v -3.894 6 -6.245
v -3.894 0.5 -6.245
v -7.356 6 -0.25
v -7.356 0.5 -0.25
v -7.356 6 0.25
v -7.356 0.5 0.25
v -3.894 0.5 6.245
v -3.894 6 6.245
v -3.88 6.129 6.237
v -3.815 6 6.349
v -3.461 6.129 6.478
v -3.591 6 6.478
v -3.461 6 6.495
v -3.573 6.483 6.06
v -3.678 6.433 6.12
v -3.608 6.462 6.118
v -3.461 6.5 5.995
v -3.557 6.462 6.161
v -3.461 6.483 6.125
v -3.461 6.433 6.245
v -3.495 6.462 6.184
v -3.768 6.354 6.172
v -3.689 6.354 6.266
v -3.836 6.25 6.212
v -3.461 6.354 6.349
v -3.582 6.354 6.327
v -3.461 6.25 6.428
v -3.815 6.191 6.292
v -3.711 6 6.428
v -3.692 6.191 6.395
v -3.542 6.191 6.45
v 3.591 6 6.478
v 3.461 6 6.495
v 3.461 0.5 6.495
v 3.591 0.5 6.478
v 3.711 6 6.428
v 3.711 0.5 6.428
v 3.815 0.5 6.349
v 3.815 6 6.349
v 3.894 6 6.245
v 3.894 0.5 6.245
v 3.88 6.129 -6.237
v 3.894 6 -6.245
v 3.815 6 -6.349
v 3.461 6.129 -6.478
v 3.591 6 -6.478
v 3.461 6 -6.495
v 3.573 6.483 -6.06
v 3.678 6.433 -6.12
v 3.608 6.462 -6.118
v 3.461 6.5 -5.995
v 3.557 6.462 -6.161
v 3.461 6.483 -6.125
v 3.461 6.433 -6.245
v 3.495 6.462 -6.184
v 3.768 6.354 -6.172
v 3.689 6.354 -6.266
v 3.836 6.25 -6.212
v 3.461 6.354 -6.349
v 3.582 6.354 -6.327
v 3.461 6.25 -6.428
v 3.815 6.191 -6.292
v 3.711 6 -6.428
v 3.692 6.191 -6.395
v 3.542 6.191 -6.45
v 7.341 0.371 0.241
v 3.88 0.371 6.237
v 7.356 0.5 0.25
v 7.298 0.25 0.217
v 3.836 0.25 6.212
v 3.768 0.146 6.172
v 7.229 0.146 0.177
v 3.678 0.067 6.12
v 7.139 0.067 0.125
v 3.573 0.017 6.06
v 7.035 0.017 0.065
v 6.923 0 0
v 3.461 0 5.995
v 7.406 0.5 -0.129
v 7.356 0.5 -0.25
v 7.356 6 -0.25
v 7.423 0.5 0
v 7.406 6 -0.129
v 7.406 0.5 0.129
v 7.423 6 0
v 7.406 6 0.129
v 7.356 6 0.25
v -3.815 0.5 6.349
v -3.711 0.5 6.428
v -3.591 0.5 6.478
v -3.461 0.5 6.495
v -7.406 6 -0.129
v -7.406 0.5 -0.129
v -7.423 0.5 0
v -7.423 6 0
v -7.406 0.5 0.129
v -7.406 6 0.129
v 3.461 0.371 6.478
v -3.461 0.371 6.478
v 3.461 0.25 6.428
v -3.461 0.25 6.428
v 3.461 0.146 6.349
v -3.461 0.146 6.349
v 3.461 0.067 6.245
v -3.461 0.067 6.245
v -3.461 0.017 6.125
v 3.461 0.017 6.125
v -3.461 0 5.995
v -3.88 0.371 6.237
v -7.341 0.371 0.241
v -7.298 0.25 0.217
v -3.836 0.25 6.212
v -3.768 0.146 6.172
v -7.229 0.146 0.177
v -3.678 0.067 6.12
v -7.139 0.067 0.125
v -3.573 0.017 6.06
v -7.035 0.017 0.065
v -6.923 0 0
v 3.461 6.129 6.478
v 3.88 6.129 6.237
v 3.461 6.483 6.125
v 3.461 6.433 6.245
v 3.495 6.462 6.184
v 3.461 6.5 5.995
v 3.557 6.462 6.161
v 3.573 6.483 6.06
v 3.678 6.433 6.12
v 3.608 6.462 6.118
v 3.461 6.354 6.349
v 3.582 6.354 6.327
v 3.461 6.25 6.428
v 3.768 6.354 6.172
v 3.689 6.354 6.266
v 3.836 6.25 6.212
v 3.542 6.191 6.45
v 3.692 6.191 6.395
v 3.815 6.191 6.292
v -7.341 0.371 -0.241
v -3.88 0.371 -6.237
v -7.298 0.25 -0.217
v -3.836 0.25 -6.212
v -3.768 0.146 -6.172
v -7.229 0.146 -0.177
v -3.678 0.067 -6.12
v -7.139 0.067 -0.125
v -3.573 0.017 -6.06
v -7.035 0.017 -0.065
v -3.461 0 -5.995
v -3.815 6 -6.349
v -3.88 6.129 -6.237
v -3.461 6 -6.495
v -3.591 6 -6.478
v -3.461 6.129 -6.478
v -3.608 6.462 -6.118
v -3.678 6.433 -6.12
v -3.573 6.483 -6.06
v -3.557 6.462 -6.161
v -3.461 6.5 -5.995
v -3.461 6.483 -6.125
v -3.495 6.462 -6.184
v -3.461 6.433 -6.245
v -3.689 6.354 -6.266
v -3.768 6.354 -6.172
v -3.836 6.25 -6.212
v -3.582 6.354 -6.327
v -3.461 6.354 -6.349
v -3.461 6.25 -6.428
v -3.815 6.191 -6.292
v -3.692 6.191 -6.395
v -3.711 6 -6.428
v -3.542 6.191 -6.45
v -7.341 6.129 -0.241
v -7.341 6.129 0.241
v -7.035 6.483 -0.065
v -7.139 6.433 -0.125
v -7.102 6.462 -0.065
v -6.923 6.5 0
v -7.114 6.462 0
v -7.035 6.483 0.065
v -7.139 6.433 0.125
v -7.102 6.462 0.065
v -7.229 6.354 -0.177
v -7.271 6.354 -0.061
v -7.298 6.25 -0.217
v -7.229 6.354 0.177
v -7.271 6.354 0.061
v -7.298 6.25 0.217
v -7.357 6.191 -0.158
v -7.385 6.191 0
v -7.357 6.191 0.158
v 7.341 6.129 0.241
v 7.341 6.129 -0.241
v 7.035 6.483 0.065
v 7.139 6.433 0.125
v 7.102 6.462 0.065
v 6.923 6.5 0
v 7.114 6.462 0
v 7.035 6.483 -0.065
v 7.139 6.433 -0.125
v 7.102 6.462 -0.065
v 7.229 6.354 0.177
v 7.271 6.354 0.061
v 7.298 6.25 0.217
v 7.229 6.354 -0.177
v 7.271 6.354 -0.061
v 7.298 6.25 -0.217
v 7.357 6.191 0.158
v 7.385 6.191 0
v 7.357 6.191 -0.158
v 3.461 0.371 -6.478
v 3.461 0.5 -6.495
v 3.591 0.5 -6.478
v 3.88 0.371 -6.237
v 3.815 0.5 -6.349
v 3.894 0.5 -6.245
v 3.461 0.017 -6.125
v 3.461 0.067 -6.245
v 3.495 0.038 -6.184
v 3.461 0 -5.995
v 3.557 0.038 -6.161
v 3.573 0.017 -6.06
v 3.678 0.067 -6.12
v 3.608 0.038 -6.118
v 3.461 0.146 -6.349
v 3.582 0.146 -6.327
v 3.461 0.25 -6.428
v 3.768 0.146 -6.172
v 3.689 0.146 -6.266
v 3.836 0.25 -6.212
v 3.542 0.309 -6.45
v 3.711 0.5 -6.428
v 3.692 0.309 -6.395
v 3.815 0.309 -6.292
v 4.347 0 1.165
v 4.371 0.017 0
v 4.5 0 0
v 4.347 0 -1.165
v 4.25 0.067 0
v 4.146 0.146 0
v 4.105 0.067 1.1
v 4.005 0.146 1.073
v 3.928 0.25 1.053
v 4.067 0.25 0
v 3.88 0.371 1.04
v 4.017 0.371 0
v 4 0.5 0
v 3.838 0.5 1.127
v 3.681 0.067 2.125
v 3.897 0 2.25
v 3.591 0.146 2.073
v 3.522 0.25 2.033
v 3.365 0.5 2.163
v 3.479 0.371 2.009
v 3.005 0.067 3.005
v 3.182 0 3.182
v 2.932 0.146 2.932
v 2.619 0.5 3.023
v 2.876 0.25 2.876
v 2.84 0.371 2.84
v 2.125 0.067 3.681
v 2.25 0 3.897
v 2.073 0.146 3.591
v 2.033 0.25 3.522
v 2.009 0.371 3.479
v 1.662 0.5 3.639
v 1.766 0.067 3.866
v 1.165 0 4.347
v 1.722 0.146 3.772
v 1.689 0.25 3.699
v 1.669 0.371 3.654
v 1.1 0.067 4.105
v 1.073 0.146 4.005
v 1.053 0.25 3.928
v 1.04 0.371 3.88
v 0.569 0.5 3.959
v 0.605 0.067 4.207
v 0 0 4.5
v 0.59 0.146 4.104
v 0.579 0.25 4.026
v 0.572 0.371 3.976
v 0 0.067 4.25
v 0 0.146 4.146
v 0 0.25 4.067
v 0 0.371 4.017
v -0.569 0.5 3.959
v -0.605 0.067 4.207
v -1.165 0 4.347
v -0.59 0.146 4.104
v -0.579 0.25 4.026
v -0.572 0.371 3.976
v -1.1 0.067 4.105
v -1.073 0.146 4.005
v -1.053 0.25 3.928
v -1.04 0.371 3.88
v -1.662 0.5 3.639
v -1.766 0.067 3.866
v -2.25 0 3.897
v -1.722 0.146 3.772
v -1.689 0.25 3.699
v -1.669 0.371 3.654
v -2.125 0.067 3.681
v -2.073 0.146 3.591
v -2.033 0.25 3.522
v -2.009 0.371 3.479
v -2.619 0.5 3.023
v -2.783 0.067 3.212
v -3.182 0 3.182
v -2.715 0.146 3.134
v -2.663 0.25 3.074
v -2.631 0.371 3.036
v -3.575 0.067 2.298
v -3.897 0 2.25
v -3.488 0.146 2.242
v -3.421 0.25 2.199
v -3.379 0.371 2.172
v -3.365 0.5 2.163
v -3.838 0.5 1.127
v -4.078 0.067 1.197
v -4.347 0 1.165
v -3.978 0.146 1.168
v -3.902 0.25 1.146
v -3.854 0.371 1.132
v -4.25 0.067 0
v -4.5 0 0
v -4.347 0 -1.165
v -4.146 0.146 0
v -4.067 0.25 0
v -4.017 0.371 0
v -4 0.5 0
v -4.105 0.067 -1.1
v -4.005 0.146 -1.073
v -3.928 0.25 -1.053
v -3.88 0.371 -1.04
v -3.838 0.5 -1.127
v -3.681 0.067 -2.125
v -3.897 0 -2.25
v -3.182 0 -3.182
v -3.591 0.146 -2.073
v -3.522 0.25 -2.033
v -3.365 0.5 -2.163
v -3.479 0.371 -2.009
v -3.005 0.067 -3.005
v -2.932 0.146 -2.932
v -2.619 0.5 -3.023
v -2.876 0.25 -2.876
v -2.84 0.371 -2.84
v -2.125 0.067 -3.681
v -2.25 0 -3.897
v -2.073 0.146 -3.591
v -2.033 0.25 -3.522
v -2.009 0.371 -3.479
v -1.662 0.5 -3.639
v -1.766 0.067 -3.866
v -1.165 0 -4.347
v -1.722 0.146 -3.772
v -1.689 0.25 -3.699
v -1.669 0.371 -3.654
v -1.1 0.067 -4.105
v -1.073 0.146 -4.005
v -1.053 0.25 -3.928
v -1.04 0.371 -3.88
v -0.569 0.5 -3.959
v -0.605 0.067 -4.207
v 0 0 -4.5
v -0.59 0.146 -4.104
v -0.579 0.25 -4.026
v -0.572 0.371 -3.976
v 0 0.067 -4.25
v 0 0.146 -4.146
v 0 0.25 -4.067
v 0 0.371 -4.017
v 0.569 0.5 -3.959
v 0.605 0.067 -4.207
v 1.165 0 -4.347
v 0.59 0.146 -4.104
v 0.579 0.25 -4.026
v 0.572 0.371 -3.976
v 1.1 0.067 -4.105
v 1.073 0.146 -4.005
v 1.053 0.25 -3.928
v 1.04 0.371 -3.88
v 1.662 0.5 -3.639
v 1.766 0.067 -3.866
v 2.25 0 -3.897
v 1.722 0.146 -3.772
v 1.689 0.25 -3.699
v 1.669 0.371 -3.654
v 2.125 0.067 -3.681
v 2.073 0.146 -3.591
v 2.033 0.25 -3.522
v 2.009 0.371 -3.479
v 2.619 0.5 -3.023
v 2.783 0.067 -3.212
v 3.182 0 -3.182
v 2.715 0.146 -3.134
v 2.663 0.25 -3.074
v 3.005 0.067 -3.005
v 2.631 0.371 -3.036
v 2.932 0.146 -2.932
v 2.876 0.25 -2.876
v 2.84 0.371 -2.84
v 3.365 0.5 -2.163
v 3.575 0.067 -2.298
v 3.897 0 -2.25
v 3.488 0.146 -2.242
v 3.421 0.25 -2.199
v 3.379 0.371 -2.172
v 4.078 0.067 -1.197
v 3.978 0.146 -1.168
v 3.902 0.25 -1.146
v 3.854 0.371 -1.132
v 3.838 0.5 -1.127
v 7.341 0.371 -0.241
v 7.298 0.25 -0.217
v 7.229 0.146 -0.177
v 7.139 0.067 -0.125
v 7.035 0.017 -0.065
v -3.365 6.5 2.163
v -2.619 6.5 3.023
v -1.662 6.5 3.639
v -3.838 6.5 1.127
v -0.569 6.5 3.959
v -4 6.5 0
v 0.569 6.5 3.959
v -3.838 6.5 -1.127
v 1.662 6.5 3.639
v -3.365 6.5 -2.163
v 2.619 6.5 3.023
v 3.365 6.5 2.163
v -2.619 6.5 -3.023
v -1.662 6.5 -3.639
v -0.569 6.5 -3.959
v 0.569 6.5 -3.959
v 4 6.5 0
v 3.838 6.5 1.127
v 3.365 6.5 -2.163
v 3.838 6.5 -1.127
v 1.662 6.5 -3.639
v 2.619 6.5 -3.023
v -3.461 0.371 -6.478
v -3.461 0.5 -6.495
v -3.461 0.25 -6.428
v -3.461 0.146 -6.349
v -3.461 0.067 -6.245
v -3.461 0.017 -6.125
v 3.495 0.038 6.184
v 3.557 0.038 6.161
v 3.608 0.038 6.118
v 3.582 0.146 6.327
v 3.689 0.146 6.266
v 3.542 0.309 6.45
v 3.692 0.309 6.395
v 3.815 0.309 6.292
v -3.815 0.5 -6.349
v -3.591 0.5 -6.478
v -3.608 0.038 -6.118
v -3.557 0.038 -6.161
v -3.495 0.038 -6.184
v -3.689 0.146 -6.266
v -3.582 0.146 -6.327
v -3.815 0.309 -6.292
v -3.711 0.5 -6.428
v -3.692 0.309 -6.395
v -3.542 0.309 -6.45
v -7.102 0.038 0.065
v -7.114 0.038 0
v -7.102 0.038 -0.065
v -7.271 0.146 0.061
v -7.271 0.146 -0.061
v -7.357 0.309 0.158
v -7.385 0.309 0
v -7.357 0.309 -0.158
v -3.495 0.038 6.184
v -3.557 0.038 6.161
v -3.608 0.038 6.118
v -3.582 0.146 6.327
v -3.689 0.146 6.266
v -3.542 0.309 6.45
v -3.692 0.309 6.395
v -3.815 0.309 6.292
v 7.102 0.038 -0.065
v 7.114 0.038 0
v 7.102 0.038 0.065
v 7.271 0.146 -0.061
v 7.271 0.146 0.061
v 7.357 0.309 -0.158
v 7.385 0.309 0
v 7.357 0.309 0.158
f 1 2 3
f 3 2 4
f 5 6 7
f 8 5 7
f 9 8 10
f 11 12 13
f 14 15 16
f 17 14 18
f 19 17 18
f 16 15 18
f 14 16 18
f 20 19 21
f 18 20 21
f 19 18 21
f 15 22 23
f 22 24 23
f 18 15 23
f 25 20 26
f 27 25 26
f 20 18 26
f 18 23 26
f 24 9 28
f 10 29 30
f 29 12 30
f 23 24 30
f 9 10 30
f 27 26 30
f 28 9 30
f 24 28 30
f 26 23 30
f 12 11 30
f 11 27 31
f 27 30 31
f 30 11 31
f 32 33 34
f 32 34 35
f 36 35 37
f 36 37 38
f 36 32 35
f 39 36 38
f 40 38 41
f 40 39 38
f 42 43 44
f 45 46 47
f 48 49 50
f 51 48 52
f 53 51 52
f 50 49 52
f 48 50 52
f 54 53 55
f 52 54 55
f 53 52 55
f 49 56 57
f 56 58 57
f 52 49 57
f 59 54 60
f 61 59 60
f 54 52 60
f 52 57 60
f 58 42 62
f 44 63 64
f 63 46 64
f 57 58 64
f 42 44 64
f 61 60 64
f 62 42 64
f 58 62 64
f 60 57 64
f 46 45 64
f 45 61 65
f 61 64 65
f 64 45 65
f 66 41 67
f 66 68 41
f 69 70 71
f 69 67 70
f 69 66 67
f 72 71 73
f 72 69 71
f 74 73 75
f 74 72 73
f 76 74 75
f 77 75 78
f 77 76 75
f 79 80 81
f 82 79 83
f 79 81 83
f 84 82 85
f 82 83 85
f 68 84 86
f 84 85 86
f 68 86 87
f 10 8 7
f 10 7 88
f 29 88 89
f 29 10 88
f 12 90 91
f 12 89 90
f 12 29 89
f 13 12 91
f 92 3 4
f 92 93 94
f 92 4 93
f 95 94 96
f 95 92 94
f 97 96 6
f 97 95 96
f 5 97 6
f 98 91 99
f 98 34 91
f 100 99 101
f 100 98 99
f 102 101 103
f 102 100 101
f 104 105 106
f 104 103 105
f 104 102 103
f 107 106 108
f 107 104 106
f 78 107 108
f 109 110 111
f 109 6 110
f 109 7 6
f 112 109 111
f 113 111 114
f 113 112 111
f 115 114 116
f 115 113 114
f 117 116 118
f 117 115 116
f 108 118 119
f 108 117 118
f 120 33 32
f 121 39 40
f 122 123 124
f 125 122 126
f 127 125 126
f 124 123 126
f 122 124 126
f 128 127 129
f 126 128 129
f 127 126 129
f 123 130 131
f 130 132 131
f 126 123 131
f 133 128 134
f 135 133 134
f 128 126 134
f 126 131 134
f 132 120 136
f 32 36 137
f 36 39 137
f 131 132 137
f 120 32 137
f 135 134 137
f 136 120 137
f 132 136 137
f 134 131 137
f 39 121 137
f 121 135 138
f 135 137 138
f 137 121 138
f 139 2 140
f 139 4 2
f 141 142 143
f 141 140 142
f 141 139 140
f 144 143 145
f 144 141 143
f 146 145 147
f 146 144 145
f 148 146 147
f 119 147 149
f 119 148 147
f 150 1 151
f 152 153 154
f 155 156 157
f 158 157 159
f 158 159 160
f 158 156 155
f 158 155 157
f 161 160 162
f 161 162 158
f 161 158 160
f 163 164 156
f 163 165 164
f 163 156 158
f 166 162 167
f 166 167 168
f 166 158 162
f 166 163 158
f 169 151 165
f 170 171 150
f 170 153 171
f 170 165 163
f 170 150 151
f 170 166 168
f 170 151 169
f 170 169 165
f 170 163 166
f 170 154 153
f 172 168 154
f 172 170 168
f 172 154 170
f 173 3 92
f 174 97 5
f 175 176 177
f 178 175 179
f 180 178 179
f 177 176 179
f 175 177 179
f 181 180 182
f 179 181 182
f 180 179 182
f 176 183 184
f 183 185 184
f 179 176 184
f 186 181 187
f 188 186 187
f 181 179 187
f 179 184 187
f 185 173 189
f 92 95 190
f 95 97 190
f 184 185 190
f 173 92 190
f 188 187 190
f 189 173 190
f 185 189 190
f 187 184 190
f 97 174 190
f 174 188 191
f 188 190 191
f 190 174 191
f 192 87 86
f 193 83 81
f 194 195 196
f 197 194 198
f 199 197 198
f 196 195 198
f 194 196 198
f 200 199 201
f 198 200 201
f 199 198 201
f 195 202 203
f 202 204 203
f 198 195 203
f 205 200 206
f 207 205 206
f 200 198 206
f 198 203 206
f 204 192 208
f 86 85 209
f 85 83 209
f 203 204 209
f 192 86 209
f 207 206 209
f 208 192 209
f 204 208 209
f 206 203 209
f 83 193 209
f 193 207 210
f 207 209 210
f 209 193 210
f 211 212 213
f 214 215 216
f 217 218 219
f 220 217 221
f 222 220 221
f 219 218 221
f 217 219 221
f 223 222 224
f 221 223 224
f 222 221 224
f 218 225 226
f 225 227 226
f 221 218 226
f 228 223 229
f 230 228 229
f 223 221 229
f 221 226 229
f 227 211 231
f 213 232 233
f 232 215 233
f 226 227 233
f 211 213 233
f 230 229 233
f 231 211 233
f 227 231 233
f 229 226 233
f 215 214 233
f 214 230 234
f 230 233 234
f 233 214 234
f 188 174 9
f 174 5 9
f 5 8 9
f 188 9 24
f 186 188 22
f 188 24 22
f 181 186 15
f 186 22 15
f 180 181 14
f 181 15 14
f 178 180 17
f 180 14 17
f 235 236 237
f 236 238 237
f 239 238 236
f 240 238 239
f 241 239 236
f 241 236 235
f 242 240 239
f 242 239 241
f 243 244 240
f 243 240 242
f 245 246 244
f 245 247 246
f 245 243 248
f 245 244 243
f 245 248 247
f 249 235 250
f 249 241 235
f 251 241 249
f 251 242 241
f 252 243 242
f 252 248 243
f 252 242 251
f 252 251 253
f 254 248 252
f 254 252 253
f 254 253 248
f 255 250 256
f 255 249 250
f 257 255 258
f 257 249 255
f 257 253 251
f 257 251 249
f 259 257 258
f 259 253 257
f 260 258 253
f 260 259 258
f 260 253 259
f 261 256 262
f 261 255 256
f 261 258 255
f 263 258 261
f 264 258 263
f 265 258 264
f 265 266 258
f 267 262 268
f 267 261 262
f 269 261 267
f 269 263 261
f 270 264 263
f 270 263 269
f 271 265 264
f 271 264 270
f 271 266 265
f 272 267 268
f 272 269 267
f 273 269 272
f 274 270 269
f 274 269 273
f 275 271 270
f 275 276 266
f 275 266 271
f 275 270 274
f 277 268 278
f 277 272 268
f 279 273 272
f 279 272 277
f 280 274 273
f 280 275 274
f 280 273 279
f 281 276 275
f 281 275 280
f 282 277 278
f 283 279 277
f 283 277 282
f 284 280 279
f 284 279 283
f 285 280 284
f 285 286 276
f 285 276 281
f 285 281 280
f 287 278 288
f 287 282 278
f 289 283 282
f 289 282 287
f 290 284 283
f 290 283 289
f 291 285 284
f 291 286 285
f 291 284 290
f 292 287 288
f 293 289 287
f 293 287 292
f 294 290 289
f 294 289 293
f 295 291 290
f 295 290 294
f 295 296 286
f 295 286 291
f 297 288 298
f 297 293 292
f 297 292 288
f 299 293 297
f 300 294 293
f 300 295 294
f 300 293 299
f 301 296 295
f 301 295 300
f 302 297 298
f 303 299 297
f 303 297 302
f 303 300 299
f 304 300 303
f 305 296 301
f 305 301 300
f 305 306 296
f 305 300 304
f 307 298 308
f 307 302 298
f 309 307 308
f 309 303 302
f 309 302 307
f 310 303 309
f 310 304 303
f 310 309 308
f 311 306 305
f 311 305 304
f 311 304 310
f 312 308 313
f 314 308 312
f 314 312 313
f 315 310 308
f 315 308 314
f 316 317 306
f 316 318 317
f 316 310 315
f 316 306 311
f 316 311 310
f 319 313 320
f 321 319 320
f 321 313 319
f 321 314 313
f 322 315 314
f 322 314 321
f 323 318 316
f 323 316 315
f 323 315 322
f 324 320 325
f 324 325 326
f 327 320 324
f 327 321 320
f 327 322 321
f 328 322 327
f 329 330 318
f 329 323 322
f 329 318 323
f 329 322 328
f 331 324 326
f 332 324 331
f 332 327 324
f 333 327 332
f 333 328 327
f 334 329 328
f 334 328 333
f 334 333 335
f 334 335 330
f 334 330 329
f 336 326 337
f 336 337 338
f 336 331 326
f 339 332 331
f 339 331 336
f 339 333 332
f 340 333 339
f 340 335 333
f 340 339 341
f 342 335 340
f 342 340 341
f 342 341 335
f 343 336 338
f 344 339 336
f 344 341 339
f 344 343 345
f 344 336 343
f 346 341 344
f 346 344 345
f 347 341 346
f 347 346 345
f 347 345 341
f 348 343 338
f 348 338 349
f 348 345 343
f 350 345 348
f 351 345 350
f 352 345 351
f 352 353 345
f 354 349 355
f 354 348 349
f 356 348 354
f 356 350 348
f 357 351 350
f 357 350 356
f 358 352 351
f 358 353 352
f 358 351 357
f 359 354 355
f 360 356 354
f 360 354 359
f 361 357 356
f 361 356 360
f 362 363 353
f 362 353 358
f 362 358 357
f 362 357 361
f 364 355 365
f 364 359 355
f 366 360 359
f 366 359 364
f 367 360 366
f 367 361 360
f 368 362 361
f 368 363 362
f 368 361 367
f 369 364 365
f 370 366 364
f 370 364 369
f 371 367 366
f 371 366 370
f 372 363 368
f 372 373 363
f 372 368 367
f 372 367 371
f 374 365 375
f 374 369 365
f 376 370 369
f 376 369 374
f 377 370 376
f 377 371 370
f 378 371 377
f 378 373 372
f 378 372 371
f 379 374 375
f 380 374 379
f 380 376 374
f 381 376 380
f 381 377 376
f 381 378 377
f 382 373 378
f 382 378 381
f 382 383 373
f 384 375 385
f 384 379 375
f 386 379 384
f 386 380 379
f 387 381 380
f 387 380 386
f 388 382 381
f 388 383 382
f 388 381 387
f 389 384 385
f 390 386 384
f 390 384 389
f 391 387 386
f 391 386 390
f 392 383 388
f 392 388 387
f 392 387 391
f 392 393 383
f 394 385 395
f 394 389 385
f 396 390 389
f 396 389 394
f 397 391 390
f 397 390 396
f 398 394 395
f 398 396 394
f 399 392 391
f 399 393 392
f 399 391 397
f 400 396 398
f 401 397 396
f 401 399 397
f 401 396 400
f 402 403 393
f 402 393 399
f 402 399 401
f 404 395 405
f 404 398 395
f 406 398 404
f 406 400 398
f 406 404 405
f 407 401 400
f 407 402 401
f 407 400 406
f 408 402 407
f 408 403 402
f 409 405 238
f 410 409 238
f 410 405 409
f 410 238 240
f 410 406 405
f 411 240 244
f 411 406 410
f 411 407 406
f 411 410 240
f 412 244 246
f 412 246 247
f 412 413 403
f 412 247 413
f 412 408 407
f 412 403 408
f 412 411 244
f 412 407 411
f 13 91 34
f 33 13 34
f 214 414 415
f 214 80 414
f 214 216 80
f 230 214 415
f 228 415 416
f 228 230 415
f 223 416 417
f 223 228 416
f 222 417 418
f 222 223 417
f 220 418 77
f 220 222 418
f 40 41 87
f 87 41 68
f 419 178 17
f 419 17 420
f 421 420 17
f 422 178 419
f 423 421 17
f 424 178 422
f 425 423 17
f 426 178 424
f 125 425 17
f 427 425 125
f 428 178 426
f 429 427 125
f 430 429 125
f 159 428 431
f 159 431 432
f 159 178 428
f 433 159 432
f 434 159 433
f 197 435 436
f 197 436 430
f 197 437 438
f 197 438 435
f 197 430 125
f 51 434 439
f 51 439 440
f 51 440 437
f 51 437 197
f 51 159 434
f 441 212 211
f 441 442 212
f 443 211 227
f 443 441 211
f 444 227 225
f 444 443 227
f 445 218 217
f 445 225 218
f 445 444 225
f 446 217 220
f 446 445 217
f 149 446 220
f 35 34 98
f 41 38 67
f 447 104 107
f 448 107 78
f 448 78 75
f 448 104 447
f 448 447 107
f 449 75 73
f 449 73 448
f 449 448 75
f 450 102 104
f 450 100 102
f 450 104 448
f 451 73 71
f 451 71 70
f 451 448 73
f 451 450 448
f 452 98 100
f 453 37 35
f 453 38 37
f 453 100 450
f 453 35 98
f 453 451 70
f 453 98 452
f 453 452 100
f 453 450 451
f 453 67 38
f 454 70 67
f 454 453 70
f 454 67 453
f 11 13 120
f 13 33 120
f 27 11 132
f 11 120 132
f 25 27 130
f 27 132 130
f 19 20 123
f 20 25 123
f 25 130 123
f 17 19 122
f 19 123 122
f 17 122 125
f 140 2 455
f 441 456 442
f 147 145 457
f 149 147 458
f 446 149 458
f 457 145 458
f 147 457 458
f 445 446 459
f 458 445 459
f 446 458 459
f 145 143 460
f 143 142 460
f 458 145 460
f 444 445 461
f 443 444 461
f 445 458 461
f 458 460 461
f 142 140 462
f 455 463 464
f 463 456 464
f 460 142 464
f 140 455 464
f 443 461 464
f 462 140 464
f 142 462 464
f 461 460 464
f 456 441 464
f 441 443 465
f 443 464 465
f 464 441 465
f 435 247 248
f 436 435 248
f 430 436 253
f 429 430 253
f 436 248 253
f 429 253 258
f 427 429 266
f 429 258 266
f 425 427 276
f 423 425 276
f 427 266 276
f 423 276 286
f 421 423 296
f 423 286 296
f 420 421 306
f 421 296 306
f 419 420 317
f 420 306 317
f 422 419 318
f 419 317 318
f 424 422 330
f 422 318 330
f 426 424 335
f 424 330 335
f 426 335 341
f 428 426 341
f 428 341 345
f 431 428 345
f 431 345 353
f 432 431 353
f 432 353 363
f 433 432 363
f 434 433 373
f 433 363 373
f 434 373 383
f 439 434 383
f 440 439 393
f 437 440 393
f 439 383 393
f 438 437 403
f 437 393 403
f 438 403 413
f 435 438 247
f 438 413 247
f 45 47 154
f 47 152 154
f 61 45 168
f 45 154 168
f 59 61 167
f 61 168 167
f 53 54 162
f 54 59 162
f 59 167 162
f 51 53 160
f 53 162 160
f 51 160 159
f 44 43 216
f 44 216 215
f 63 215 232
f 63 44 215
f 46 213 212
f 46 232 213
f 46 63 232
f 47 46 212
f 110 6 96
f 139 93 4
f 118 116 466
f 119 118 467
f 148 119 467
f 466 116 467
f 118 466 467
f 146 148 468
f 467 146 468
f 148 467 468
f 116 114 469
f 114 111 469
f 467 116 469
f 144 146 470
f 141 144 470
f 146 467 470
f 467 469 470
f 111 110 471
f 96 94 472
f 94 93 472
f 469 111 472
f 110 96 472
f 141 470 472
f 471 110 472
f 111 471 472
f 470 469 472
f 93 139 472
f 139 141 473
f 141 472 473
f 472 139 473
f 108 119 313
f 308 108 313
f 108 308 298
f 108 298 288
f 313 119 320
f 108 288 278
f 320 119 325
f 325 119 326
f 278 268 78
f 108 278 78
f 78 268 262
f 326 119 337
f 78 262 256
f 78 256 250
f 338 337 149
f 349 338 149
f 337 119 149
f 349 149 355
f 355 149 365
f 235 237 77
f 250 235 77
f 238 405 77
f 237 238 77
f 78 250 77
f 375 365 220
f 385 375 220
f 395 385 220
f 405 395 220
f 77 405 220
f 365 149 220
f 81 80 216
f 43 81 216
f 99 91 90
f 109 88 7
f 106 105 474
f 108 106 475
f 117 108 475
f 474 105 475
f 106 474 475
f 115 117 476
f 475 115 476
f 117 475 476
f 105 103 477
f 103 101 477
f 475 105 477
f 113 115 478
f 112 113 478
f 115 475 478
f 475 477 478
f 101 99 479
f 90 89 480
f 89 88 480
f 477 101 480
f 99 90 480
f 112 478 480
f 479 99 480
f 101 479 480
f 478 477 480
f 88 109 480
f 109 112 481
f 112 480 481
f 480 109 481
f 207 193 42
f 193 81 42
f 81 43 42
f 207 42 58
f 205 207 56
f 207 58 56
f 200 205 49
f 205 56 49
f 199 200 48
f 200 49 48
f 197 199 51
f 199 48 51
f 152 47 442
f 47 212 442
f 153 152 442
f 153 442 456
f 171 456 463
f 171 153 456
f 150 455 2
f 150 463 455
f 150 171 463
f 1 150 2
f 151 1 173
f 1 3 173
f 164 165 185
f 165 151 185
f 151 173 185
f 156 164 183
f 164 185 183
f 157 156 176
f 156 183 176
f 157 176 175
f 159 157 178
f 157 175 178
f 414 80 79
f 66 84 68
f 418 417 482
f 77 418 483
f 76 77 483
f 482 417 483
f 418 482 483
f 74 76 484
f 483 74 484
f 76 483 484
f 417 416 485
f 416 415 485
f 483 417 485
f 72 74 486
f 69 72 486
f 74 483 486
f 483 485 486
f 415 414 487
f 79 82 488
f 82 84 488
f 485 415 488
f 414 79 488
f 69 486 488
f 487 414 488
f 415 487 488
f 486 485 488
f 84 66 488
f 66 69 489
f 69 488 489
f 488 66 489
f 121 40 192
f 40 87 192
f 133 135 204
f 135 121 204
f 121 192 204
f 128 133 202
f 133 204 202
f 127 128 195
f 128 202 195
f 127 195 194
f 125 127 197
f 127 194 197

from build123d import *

# Parameters (mm, degrees)
EXTRUDE3_DEPTH = 6.5
FILLET3_R      = 0.5
SKETCH2_R      = 4
EXTRUDE4_DEPTH = 6.5
FILLET5_R      = 0.5


with BuildPart() as part:
    # Sketch1 → Extrude3 (new body)
    with BuildSketch(Plane(origin=(0, 0, 0), x_dir=(1, 0, 0), z_dir=(0, 1, 0))):
        Polygon((7.5, 0), (3.75, 6.495190528), (-3.75, 6.495190528), (-7.5, 0), (-3.75, -6.495190528), (3.75, -6.495190528), align=None)
    extrude(amount=EXTRUDE3_DEPTH)

    # Fillet3
    fillet3_edges = [part.edges().sort_by_distance(p)[0] for p in [
        (0, 6.5, -6.495190528),
        (3.75, 3.25, 6.495190528),
        (-3.75, 3.25, 6.495190528),
        (-7.5, 3.25, 0),
        (-3.75, 3.25, -6.495190528),
        (3.75, 3.25, -6.495190528),
        (7.5, 3.25, 0),
        (-5.625, 6.5, -3.247595264),
        (-5.625, 6.5, 3.247595264),
        (0, 6.5, 6.495190528),
        (5.625, 6.5, 3.247595264),
        (0, 0, 6.495190528),
        (-5.625, 0, 3.247595264),
        (-5.625, 0, -3.247595264),
        (5.625, 6.5, -3.247595264),
        (0, 0, -6.495190528),
        (5.625, 0, -3.247595264),
        (5.625, 0, 3.247595264),
    ]]
    fillet(fillet3_edges, radius=FILLET3_R)

    # Sketch2 → Extrude4 (cut)
    with BuildSketch(Plane.XZ):
        Circle(SKETCH2_R)
    extrude(amount=-EXTRUDE4_DEPTH, mode=Mode.SUBTRACT)

    # Fillet5
    fillet5_edges = [part.edges().sort_by_distance(p)[0] for p in [
        (-4, 0, 0),
    ]]
    fillet(fillet5_edges, radius=FILLET5_R)


solid = part.part
